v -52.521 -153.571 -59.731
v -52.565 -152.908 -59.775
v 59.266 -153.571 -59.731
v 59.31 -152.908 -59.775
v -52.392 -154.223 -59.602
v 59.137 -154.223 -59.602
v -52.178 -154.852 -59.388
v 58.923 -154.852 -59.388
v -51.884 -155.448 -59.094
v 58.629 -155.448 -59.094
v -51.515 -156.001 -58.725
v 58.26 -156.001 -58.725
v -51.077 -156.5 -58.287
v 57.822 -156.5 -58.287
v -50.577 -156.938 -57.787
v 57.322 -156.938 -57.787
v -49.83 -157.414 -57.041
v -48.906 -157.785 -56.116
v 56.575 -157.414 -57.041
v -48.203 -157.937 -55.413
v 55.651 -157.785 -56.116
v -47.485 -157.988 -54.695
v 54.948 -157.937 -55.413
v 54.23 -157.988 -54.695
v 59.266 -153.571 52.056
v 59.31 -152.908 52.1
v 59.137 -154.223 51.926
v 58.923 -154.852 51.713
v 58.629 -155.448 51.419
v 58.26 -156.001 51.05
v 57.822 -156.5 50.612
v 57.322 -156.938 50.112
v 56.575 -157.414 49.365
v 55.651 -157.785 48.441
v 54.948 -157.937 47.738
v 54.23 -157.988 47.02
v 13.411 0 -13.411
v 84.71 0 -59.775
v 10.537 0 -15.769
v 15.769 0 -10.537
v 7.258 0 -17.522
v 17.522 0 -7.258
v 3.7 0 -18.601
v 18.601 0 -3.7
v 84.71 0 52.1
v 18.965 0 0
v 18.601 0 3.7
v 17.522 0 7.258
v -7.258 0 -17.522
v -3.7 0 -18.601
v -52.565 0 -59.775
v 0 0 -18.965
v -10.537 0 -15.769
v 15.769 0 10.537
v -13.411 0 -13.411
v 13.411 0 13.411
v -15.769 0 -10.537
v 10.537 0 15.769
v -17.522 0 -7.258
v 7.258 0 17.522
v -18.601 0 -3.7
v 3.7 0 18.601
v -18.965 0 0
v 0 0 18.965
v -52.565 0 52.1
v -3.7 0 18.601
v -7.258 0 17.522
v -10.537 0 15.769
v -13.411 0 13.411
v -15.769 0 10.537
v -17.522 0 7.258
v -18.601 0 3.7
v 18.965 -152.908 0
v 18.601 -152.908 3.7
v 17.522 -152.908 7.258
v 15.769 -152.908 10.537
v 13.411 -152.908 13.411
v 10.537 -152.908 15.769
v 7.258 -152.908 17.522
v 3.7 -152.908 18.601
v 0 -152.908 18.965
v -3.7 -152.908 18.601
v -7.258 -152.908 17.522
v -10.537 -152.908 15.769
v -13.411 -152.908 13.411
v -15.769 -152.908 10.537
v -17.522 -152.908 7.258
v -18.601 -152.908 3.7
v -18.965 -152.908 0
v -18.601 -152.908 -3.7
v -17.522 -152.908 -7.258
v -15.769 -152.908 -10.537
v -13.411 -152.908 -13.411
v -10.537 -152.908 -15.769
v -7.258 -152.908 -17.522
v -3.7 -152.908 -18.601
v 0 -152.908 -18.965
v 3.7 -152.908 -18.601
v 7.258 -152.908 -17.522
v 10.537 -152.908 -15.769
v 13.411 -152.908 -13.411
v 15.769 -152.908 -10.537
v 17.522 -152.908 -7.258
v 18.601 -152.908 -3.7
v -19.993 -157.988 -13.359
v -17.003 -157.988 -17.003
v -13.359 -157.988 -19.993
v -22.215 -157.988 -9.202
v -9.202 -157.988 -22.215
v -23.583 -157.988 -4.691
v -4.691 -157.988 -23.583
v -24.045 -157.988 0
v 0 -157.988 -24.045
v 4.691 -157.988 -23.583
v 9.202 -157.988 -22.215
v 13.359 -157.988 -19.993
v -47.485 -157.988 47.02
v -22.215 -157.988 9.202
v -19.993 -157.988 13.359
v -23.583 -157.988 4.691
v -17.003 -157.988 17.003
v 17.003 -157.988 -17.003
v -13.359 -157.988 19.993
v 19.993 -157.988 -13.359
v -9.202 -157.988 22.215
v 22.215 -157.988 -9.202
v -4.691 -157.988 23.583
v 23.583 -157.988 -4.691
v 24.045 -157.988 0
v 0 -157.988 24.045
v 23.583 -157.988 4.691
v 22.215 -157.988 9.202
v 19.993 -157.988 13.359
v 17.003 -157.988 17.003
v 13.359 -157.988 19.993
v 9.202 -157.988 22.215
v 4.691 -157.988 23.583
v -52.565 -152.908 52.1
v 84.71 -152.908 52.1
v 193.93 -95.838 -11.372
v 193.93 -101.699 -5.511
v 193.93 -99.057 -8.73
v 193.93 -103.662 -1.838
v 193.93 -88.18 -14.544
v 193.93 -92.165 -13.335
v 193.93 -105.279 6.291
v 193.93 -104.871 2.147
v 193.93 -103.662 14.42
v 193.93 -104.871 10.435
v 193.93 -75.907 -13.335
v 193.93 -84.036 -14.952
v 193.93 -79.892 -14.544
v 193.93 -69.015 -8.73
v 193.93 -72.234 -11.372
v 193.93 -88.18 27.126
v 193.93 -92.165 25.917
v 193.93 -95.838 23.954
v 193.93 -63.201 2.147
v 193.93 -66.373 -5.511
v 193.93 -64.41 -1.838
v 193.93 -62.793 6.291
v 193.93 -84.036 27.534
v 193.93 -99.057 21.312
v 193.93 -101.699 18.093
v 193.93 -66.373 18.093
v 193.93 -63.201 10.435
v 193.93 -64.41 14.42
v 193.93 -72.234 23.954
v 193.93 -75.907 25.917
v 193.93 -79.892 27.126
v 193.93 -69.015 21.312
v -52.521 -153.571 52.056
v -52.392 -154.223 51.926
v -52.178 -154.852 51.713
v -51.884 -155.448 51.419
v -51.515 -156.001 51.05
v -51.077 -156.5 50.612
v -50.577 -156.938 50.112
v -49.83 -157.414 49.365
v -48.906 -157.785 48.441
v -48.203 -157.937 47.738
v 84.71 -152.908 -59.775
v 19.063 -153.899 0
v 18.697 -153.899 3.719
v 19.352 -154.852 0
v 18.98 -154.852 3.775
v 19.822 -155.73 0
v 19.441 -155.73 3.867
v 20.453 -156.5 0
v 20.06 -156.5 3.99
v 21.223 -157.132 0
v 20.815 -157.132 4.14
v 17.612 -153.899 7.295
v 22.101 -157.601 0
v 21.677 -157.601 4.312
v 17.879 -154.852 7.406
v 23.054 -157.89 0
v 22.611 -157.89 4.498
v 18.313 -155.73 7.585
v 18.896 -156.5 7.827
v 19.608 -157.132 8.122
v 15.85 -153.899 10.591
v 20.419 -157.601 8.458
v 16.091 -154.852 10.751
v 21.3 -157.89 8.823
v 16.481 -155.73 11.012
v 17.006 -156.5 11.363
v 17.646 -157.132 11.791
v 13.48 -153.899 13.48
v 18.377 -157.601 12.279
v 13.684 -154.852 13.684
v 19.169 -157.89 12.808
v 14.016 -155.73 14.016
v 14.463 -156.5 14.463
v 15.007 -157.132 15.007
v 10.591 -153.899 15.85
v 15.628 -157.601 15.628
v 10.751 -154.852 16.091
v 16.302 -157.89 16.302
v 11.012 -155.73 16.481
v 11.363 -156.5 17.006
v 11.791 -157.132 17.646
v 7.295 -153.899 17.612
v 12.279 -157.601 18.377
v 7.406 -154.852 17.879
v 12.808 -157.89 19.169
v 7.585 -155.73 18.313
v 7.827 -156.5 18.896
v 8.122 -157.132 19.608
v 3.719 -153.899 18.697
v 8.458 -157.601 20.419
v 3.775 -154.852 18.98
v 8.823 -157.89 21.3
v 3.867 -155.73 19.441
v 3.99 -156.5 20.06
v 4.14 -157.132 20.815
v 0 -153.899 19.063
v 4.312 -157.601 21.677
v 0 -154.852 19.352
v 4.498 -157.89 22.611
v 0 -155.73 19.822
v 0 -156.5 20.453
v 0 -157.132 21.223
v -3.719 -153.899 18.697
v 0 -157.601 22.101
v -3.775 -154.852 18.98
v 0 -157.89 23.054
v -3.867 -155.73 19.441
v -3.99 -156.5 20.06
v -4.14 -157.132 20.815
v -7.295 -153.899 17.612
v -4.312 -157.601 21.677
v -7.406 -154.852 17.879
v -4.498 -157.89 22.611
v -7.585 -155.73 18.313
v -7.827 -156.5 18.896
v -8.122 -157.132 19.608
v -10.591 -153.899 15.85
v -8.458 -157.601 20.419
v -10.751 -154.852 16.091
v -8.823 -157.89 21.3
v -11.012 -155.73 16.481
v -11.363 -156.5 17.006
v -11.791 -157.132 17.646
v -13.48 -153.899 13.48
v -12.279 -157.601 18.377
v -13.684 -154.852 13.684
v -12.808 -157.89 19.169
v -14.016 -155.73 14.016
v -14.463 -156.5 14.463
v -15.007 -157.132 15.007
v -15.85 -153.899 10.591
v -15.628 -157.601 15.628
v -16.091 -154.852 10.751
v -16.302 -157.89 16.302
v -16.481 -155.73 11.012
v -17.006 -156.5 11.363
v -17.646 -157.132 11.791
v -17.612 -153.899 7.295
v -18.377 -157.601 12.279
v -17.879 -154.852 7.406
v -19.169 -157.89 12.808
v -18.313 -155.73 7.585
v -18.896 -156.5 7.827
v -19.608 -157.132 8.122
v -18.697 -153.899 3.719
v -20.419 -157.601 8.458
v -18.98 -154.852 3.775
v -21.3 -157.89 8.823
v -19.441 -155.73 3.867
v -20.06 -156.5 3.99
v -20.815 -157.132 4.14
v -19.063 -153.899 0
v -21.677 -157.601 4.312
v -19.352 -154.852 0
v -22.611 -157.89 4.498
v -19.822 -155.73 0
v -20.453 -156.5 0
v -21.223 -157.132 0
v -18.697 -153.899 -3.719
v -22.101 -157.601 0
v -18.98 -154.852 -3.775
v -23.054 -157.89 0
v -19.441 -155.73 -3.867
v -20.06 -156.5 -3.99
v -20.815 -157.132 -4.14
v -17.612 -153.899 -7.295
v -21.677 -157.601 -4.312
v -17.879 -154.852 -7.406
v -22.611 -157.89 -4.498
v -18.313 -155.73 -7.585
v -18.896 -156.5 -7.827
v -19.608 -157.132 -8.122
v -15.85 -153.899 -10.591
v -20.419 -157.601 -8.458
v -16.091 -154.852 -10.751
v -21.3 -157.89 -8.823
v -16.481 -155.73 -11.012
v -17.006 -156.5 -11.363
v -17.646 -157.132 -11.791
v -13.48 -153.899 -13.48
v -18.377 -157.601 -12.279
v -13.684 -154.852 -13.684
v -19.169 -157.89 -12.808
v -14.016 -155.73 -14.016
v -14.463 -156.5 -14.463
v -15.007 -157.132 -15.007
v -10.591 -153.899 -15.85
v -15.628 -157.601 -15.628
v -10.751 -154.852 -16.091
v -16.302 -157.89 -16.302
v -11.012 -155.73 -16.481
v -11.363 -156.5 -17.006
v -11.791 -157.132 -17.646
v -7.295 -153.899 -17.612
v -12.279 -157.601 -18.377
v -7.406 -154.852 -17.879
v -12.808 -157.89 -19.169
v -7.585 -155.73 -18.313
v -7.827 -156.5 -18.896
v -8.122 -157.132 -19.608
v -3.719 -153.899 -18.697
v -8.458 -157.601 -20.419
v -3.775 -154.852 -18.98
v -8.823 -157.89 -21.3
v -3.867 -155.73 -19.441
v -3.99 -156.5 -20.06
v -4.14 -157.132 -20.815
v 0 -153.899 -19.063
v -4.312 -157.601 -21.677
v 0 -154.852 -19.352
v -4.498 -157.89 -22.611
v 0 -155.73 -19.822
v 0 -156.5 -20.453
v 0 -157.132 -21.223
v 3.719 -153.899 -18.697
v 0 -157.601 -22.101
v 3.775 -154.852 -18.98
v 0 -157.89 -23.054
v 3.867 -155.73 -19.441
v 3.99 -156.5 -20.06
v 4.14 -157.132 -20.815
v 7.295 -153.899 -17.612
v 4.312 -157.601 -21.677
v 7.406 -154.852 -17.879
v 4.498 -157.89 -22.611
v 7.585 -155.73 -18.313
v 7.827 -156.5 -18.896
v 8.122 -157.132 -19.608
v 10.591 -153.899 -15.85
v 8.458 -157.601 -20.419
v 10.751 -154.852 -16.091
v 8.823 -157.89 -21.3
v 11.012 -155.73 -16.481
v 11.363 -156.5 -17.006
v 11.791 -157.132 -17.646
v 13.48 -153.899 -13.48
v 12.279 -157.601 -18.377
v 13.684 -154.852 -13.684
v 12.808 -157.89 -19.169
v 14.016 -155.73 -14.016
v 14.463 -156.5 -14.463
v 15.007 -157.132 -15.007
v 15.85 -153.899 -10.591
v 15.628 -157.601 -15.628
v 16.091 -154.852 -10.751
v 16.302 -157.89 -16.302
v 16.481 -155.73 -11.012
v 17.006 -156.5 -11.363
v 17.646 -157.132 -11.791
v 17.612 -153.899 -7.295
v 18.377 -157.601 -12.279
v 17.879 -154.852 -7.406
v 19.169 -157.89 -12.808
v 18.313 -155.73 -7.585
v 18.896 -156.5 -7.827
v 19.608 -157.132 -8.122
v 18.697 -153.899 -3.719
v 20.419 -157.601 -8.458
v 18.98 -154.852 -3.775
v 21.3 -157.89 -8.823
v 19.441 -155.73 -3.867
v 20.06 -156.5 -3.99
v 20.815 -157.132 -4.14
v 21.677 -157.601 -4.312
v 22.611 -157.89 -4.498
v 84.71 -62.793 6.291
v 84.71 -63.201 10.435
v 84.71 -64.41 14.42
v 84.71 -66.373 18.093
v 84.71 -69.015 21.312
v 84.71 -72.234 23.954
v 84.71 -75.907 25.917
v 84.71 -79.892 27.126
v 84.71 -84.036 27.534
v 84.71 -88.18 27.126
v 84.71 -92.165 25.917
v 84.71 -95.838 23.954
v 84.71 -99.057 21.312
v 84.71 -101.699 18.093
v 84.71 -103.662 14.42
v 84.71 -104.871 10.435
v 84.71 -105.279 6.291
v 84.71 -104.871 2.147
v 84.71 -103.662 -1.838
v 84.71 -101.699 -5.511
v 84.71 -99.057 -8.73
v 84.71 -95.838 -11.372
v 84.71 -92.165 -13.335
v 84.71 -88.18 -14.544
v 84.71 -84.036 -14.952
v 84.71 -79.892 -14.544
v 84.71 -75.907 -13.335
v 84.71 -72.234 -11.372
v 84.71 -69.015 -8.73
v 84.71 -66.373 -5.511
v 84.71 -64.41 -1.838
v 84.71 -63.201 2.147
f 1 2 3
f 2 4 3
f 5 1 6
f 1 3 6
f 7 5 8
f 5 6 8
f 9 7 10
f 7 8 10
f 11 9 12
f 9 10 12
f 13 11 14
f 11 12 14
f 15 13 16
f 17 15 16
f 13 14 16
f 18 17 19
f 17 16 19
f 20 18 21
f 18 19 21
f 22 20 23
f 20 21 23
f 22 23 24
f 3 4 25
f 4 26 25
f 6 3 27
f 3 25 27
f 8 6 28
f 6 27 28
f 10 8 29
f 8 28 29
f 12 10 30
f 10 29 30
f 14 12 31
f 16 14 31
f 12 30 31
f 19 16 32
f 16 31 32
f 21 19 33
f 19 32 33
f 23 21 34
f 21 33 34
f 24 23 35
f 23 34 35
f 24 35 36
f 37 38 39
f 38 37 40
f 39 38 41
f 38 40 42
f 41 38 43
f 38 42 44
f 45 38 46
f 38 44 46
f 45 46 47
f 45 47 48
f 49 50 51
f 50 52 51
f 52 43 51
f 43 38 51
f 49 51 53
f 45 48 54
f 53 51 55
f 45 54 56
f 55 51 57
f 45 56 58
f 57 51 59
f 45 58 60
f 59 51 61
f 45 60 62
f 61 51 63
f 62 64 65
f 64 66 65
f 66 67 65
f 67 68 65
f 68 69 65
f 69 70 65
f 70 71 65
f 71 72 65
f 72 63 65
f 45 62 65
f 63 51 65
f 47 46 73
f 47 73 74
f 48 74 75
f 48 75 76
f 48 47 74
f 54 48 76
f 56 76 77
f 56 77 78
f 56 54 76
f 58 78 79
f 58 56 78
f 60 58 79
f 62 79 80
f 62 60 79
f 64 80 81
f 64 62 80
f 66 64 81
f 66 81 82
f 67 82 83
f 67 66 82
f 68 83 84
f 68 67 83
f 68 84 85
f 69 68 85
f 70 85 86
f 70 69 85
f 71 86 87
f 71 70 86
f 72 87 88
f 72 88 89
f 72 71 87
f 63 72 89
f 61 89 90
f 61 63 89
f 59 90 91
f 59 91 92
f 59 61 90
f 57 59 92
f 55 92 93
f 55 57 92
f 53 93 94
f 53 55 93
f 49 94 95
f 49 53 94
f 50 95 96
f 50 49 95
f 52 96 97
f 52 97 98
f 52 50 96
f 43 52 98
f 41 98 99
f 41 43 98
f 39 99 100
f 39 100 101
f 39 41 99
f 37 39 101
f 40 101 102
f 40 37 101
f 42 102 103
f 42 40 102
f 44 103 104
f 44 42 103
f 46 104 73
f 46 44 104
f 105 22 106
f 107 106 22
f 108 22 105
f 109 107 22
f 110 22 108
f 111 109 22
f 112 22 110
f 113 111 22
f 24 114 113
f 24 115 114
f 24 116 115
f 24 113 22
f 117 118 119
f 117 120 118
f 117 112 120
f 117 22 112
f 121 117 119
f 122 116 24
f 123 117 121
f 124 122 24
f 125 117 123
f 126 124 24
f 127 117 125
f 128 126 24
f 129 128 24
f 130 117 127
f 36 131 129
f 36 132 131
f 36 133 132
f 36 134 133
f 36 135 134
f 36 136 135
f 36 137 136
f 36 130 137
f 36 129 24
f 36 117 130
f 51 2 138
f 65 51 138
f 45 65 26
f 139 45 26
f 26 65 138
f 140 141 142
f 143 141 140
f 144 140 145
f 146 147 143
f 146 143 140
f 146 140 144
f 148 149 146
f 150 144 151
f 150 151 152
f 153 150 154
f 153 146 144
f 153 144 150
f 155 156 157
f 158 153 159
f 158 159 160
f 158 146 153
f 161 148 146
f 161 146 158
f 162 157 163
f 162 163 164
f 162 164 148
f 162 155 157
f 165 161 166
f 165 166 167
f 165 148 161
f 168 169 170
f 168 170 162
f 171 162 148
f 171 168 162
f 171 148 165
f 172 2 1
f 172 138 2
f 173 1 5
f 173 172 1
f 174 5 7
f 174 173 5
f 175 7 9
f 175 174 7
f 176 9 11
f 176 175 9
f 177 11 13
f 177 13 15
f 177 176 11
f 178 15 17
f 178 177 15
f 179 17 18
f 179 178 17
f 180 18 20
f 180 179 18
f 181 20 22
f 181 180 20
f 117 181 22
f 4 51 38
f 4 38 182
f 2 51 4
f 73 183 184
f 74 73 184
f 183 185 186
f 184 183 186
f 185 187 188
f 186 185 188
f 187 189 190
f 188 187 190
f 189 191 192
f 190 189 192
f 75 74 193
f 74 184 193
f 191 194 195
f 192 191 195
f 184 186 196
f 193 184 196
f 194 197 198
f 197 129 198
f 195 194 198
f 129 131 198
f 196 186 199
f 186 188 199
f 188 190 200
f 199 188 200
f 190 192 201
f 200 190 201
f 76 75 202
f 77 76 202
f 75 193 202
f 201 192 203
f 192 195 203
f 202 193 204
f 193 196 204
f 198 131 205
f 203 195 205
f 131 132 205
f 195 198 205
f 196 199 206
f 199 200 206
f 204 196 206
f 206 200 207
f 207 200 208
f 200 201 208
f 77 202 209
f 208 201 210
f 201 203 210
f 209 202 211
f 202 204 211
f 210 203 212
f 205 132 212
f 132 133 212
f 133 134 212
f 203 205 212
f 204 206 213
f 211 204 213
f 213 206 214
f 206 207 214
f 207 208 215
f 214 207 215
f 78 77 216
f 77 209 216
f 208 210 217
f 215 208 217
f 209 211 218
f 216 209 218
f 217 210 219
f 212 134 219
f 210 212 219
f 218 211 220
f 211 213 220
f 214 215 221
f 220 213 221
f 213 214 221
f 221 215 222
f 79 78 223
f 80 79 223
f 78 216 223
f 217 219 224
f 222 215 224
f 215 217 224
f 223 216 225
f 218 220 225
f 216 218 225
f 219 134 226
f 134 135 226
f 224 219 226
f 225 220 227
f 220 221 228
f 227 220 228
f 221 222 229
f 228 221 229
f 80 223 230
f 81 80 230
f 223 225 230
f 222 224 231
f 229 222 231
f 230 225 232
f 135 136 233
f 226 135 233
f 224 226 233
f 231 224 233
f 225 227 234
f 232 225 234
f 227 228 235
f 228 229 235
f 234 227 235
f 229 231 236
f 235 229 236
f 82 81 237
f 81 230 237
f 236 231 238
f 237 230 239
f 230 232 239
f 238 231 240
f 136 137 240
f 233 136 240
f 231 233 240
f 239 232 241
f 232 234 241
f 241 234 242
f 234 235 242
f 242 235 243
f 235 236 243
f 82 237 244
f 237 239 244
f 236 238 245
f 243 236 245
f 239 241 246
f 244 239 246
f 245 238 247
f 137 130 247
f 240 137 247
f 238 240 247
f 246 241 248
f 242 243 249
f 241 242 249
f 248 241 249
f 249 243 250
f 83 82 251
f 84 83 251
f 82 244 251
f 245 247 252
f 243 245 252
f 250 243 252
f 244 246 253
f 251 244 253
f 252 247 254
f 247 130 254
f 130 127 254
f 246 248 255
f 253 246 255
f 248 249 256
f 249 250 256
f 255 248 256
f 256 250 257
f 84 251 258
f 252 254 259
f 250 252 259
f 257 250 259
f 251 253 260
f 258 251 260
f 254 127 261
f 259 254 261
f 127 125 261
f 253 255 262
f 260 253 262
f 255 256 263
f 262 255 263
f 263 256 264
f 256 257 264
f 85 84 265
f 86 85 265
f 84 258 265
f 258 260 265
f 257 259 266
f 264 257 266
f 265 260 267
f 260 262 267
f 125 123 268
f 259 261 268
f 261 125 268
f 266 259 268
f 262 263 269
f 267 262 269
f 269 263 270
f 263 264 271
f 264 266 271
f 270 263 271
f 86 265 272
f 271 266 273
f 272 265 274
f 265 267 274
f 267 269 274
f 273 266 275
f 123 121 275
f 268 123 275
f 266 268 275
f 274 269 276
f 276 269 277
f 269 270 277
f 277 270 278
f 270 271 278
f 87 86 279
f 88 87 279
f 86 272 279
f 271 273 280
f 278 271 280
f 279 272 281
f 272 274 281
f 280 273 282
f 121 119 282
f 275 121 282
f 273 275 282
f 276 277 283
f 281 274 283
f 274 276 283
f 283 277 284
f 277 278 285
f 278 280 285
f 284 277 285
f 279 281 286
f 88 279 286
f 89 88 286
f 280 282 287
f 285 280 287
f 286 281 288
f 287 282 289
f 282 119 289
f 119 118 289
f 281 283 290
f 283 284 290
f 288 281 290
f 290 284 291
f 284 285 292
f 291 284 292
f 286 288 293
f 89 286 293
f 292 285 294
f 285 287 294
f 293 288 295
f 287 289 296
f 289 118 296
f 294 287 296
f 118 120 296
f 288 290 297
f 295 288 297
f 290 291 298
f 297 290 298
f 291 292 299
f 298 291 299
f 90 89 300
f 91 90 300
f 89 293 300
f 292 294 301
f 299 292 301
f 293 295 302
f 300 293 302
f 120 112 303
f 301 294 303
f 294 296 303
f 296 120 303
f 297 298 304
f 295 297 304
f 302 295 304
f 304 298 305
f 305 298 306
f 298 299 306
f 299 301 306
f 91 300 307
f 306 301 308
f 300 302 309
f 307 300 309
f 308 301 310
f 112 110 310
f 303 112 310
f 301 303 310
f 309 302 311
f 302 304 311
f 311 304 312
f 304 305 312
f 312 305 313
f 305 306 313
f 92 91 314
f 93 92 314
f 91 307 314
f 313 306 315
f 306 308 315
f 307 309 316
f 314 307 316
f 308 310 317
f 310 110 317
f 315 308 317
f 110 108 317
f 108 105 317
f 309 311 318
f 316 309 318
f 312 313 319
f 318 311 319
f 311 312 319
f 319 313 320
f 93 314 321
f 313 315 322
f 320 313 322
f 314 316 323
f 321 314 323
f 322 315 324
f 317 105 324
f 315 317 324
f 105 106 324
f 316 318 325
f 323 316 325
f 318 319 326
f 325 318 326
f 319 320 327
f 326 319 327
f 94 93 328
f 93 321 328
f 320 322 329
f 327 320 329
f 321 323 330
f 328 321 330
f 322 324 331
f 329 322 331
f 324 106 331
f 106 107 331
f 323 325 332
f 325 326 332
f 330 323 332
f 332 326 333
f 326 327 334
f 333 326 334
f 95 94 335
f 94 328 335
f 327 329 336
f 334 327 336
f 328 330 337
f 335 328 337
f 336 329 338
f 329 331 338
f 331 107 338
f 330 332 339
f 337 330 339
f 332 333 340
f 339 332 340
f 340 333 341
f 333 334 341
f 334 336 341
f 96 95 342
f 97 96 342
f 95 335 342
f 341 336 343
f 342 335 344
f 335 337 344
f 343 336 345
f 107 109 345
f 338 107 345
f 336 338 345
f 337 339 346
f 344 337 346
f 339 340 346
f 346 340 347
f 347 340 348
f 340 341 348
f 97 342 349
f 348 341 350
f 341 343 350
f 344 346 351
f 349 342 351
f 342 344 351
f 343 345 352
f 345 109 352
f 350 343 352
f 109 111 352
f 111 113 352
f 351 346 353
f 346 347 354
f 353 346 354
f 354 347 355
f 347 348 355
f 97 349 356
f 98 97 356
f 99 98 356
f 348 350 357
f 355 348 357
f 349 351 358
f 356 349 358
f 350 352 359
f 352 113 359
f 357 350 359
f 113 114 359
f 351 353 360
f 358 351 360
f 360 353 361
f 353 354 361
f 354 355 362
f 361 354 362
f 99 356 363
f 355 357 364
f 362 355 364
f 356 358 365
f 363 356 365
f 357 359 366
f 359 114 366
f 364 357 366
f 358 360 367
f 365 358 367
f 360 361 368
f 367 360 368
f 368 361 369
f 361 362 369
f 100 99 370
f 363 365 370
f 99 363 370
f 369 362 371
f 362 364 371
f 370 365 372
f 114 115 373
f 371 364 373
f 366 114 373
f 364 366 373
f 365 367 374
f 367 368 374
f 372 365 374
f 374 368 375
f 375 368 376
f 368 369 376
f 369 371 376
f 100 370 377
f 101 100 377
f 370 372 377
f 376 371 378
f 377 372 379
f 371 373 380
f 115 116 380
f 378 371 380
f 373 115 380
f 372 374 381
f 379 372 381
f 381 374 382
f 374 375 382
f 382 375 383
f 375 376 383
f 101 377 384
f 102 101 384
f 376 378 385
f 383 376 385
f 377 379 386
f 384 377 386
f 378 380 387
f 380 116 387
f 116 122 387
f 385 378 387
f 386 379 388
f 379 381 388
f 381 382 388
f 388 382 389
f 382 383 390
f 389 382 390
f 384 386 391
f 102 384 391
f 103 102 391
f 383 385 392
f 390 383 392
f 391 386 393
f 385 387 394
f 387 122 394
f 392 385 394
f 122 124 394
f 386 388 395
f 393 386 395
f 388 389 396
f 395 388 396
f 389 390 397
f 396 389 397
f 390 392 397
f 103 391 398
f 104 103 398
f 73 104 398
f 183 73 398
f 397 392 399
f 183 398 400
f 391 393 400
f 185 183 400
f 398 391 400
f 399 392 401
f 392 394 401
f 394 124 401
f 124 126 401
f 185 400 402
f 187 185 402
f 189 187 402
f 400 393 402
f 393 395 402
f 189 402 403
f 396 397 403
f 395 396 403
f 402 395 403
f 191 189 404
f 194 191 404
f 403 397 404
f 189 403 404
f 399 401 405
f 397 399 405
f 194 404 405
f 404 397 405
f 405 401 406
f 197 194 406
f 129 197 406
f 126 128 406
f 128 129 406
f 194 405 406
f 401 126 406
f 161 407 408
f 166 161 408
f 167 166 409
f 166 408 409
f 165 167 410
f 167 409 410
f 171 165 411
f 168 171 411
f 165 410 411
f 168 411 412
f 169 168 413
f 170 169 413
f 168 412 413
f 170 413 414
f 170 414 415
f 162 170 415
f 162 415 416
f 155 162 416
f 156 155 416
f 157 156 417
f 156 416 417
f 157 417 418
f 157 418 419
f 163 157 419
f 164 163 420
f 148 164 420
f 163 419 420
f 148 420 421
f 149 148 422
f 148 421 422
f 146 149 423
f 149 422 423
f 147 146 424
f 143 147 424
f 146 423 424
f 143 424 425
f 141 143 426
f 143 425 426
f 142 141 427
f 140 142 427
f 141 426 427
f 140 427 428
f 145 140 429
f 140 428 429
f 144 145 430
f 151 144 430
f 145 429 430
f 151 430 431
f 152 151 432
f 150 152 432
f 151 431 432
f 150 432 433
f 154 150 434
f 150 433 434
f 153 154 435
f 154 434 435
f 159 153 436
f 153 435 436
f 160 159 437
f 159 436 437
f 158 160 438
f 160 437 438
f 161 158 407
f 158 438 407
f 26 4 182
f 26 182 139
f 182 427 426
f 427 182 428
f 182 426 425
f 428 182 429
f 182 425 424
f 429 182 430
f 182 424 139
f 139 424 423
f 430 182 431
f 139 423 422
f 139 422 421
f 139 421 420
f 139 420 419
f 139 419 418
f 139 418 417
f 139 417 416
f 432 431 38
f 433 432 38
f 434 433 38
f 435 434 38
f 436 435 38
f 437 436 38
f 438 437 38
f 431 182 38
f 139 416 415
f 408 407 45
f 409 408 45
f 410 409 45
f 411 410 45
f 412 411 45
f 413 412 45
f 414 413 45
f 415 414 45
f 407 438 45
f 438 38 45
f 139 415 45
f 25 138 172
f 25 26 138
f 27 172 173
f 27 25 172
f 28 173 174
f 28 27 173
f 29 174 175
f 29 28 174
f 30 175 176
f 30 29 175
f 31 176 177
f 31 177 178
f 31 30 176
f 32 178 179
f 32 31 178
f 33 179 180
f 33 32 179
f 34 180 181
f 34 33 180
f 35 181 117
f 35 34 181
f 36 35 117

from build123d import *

# Parameters (mm, degrees)
F0_W     = 111.8744499981
F0_H     = 111.8744499981
F0_R     = 18.9654871471
F1_DEPTH = 157.988
F2_R     = 5.08
F3_DEPTH = 25.4
F4_R     = 21.242968454
F5_DEPTH = 109.22


with BuildPart() as f1:
    # F0 (on Front) → F1 (new body)
    with BuildSketch(Plane.XZ):
        with Locations((3.3725146204, -3.8376878947)):
            Rectangle(F0_W, F0_H)
        Circle(F0_R, mode=Mode.SUBTRACT)
    extrude(amount=F1_DEPTH)

    # F2
    f2_edges = [f1.edges().sort_by_distance(p)[0] for p in [
        (3.372515, -157.988, 52.099537),
        (-52.56471, -157.988, -3.837688),
        (3.372515, -157.988, -59.774913),
        (59.30974, -157.988, -3.837688),
        (-18.965487, -157.988, 0),
    ]]
    fillet(f2_edges, radius=F2_R)

    # F3 (add): a face of the model
    f3_faces = [f1.faces().sort_by_distance(p)[0] for p in [
        (59.3097396195, -76.454, -3.8376878947),
    ]]
    extrude(f3_faces, amount=F3_DEPTH)

    # F4 (on face) → F5 (join)
    with BuildSketch(Plane.YZ.offset(84.7097396195)):
        with Locations((-84.0359479189, 6.2909969129)):
            Circle(F4_R)
    extrude(amount=F5_DEPTH)


solid = f1.part
